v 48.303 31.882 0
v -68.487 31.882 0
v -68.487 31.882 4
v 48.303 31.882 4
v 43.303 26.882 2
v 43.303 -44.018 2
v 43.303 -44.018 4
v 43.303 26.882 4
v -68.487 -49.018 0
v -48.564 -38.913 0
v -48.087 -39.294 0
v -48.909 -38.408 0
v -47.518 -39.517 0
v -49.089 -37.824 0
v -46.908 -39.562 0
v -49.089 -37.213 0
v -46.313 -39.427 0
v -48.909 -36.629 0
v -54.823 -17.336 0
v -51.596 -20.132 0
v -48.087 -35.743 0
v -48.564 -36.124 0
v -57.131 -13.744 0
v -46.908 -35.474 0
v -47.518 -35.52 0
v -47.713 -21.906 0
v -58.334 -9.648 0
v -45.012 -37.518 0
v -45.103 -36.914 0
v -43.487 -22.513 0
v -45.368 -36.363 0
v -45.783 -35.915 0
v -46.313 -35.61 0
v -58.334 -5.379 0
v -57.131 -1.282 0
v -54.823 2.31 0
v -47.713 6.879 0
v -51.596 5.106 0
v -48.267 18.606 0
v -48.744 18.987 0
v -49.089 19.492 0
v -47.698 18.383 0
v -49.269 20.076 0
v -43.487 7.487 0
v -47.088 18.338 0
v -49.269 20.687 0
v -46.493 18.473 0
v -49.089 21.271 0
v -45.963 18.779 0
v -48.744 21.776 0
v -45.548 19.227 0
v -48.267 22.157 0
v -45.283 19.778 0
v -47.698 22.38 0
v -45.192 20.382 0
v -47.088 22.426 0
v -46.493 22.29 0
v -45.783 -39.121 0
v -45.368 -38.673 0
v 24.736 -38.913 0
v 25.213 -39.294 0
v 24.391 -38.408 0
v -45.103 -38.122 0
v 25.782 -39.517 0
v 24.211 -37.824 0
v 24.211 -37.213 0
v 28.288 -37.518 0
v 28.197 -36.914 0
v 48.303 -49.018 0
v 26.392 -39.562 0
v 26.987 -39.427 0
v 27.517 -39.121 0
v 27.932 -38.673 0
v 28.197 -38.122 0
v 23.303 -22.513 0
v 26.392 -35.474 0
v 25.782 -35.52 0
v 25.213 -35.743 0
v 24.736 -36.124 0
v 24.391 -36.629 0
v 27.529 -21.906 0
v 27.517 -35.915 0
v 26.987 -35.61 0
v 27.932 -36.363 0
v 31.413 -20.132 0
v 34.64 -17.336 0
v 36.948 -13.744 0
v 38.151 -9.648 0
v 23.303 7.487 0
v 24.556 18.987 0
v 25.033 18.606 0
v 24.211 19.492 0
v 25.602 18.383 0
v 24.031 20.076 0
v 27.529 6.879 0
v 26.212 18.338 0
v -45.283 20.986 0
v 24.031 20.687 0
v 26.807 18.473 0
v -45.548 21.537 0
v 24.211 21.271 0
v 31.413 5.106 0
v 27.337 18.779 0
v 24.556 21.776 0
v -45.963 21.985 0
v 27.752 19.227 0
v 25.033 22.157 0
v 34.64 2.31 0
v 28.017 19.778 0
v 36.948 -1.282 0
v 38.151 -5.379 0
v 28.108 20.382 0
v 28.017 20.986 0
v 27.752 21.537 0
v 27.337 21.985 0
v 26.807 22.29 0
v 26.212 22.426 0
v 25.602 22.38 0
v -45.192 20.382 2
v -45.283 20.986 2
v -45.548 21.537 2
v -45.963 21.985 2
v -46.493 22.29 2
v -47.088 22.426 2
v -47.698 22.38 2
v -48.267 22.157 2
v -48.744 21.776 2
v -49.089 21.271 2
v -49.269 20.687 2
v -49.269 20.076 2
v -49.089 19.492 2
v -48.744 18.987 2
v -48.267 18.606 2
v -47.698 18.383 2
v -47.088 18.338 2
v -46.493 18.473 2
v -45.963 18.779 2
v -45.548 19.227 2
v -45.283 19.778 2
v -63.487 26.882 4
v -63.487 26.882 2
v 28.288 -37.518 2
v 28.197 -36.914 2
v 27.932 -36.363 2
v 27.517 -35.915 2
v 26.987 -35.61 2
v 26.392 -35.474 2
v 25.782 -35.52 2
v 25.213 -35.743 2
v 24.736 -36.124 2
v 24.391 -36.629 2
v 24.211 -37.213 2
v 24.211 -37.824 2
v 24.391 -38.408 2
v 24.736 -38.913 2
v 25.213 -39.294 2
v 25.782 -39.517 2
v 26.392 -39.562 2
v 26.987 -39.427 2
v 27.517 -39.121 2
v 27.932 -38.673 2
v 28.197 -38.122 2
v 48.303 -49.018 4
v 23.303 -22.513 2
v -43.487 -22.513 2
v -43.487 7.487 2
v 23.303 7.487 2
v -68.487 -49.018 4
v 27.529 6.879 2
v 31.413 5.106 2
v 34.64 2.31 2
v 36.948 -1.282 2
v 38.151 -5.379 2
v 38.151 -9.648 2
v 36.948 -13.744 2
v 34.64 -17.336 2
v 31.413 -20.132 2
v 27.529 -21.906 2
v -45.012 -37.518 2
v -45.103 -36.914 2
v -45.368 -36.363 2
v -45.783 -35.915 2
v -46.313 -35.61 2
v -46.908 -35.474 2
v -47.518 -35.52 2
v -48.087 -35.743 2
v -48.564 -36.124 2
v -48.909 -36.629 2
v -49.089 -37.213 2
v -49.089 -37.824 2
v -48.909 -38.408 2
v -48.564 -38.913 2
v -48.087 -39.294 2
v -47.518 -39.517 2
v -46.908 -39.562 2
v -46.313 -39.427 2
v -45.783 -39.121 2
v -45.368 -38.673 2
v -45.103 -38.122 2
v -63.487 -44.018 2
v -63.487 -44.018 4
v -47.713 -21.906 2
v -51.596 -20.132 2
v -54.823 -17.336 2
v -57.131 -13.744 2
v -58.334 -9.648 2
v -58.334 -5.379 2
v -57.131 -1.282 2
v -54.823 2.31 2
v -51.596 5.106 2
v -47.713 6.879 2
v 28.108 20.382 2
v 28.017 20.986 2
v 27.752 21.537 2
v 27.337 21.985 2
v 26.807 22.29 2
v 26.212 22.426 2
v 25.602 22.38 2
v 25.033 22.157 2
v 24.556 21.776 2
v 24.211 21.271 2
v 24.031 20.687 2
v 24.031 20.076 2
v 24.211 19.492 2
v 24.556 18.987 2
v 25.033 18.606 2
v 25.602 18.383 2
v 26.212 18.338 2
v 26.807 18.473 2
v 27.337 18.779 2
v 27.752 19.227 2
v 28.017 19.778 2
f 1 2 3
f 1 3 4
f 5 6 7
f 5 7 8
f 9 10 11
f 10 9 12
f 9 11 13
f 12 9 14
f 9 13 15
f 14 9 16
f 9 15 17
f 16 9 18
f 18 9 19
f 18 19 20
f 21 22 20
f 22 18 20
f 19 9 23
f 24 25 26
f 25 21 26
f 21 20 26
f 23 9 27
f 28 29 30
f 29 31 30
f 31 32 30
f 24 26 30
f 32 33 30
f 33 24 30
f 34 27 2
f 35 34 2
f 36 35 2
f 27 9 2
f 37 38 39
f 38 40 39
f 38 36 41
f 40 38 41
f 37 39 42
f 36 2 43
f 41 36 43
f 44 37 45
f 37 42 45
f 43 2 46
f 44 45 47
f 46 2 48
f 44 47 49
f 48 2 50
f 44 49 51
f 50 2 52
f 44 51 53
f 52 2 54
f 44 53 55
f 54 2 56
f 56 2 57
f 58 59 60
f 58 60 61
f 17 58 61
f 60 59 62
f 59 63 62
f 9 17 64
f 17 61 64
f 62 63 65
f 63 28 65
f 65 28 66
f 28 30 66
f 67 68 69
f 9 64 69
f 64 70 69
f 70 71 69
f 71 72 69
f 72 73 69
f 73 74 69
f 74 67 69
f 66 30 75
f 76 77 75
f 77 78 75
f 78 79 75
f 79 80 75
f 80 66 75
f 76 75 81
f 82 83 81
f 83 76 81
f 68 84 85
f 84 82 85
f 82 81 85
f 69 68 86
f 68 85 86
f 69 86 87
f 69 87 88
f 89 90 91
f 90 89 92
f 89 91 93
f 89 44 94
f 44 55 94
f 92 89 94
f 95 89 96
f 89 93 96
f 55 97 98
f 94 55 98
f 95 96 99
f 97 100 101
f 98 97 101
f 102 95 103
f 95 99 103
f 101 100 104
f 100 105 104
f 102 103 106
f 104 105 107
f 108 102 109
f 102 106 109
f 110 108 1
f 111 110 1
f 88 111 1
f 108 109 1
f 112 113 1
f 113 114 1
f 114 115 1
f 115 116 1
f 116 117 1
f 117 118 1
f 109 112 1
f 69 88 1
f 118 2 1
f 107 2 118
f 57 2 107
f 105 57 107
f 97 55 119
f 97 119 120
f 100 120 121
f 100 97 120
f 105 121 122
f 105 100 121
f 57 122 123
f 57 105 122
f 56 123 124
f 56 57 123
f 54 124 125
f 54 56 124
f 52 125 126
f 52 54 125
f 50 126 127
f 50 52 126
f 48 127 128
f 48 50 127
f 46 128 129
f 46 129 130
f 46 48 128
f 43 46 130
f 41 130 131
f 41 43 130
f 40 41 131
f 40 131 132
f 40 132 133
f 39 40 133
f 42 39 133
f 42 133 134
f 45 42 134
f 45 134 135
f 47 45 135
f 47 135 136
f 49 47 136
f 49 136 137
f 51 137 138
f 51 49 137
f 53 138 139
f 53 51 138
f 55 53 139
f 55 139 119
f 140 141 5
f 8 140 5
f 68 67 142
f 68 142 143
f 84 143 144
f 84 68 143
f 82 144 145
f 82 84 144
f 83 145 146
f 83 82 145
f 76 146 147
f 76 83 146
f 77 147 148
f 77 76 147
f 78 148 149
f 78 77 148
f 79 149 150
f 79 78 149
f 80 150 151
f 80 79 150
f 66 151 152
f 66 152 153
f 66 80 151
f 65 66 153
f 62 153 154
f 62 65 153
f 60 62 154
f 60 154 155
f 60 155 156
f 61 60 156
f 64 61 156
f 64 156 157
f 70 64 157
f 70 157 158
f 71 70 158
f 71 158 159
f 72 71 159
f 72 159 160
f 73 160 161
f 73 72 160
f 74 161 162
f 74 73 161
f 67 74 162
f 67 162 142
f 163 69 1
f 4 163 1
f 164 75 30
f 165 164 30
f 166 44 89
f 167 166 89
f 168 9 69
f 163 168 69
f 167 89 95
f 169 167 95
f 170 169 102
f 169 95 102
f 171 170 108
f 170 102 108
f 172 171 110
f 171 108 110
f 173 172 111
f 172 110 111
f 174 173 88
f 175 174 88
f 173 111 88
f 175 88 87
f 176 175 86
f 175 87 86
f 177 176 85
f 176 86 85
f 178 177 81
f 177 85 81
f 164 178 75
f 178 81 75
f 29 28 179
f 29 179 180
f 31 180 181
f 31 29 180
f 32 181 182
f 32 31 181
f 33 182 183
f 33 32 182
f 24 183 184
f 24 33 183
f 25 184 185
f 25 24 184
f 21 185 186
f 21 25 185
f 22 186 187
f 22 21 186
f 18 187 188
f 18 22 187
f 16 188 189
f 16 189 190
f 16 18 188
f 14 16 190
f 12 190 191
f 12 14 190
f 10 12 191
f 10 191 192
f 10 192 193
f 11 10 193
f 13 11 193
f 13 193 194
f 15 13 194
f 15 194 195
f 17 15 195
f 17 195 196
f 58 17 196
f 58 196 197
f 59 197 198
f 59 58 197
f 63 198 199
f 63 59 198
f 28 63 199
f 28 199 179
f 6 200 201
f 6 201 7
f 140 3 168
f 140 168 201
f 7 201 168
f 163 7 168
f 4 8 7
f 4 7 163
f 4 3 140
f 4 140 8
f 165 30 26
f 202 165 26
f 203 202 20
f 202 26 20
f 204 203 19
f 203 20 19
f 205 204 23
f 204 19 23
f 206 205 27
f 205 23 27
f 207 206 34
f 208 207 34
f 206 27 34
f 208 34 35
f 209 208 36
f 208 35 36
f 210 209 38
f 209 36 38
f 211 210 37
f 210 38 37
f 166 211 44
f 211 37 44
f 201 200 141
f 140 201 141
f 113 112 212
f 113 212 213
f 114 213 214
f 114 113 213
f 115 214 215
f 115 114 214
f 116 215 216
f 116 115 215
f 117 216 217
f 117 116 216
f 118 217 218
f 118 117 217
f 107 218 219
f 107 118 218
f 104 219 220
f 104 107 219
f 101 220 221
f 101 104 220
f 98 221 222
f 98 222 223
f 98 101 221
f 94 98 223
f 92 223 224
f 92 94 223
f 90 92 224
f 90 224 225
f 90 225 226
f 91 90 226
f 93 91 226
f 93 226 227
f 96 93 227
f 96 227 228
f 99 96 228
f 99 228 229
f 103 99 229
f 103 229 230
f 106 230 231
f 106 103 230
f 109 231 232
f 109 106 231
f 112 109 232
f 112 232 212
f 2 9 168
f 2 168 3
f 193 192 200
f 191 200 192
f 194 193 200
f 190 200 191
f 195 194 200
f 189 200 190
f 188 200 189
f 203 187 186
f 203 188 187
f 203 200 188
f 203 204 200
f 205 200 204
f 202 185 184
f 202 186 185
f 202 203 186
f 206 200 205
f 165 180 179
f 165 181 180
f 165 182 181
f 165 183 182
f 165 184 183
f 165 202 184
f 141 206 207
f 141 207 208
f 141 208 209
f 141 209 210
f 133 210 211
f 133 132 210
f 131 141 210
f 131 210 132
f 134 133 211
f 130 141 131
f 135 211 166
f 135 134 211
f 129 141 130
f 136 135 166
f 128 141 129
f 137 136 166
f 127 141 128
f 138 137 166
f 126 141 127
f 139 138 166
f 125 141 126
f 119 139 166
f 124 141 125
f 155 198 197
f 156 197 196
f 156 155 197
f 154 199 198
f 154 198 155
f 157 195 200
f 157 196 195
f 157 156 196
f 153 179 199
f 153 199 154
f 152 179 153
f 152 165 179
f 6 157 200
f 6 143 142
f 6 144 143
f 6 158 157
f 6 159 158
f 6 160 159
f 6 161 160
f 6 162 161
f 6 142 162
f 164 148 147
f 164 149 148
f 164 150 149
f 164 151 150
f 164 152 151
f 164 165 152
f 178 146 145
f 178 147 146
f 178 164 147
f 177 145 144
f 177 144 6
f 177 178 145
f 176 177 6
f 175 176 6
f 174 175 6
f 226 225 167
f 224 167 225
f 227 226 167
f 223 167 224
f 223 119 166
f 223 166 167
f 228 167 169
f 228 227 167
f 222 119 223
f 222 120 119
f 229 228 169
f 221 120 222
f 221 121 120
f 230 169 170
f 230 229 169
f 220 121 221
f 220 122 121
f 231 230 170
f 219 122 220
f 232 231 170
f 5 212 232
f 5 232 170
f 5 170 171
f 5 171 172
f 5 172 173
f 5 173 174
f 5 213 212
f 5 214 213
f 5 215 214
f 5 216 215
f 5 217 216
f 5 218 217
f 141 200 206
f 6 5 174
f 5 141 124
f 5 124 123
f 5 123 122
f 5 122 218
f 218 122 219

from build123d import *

# Parameters (mm, degrees)
F0_W     = 106.79
F0_H     = 70.9
F0_R     = 2.05
F1_DEPTH = 2
F0_W_2   = 116.79
F0_H_2   = 80.9
F2_DEPTH = 4


with BuildPart() as f1:
    # F0 (on Top) → F1 (new body)
    with BuildSketch(Plane.XY):
        with Locations((-10.0916011143, -8.5682209864)):
            Rectangle(F0_W, F0_H)
        with Locations((-47.0616011143, -37.5182209864)):
            Circle(F0_R, mode=Mode.SUBTRACT)
        with Locations((26.2383988857, -37.5182209864)):
            Circle(F0_R, mode=Mode.SUBTRACT)
        with Locations((-47.2416011143, 20.3817790136)):
            Circle(F0_R, mode=Mode.SUBTRACT)
        with BuildLine():
            Line((23.3033988857, -22.5132511556), (-43.4866011143, -22.5132511556))
            ThreePointArc((-43.4866011143, -22.5132511556), (-58.4866011143, -7.5132511556), (-43.4866011143, 7.4867488444))
            Line((-43.4866011143, 7.4867488444), (23.3033988857, 7.4867488444))
            ThreePointArc((23.3033988857, 7.4867488444), (38.3033988857, -7.5132511556), (23.3033988857, -22.5132511556))
        make_face(mode=Mode.SUBTRACT)
        with Locations((26.0583988857, 20.3817790136)):
            Circle(F0_R, mode=Mode.SUBTRACT)
    extrude(amount=F1_DEPTH)

    # F0 (on Top) → F2 (join)
    with BuildSketch(Plane.XY):
        with Locations((-10.0916011143, -8.5682209864)):
            Rectangle(F0_W_2, F0_H_2)
        with Locations((-10.0916011143, -8.5682209864)):
            Rectangle(F0_W, F0_H, mode=Mode.SUBTRACT)
    extrude(amount=F2_DEPTH)


solid = f1.part
